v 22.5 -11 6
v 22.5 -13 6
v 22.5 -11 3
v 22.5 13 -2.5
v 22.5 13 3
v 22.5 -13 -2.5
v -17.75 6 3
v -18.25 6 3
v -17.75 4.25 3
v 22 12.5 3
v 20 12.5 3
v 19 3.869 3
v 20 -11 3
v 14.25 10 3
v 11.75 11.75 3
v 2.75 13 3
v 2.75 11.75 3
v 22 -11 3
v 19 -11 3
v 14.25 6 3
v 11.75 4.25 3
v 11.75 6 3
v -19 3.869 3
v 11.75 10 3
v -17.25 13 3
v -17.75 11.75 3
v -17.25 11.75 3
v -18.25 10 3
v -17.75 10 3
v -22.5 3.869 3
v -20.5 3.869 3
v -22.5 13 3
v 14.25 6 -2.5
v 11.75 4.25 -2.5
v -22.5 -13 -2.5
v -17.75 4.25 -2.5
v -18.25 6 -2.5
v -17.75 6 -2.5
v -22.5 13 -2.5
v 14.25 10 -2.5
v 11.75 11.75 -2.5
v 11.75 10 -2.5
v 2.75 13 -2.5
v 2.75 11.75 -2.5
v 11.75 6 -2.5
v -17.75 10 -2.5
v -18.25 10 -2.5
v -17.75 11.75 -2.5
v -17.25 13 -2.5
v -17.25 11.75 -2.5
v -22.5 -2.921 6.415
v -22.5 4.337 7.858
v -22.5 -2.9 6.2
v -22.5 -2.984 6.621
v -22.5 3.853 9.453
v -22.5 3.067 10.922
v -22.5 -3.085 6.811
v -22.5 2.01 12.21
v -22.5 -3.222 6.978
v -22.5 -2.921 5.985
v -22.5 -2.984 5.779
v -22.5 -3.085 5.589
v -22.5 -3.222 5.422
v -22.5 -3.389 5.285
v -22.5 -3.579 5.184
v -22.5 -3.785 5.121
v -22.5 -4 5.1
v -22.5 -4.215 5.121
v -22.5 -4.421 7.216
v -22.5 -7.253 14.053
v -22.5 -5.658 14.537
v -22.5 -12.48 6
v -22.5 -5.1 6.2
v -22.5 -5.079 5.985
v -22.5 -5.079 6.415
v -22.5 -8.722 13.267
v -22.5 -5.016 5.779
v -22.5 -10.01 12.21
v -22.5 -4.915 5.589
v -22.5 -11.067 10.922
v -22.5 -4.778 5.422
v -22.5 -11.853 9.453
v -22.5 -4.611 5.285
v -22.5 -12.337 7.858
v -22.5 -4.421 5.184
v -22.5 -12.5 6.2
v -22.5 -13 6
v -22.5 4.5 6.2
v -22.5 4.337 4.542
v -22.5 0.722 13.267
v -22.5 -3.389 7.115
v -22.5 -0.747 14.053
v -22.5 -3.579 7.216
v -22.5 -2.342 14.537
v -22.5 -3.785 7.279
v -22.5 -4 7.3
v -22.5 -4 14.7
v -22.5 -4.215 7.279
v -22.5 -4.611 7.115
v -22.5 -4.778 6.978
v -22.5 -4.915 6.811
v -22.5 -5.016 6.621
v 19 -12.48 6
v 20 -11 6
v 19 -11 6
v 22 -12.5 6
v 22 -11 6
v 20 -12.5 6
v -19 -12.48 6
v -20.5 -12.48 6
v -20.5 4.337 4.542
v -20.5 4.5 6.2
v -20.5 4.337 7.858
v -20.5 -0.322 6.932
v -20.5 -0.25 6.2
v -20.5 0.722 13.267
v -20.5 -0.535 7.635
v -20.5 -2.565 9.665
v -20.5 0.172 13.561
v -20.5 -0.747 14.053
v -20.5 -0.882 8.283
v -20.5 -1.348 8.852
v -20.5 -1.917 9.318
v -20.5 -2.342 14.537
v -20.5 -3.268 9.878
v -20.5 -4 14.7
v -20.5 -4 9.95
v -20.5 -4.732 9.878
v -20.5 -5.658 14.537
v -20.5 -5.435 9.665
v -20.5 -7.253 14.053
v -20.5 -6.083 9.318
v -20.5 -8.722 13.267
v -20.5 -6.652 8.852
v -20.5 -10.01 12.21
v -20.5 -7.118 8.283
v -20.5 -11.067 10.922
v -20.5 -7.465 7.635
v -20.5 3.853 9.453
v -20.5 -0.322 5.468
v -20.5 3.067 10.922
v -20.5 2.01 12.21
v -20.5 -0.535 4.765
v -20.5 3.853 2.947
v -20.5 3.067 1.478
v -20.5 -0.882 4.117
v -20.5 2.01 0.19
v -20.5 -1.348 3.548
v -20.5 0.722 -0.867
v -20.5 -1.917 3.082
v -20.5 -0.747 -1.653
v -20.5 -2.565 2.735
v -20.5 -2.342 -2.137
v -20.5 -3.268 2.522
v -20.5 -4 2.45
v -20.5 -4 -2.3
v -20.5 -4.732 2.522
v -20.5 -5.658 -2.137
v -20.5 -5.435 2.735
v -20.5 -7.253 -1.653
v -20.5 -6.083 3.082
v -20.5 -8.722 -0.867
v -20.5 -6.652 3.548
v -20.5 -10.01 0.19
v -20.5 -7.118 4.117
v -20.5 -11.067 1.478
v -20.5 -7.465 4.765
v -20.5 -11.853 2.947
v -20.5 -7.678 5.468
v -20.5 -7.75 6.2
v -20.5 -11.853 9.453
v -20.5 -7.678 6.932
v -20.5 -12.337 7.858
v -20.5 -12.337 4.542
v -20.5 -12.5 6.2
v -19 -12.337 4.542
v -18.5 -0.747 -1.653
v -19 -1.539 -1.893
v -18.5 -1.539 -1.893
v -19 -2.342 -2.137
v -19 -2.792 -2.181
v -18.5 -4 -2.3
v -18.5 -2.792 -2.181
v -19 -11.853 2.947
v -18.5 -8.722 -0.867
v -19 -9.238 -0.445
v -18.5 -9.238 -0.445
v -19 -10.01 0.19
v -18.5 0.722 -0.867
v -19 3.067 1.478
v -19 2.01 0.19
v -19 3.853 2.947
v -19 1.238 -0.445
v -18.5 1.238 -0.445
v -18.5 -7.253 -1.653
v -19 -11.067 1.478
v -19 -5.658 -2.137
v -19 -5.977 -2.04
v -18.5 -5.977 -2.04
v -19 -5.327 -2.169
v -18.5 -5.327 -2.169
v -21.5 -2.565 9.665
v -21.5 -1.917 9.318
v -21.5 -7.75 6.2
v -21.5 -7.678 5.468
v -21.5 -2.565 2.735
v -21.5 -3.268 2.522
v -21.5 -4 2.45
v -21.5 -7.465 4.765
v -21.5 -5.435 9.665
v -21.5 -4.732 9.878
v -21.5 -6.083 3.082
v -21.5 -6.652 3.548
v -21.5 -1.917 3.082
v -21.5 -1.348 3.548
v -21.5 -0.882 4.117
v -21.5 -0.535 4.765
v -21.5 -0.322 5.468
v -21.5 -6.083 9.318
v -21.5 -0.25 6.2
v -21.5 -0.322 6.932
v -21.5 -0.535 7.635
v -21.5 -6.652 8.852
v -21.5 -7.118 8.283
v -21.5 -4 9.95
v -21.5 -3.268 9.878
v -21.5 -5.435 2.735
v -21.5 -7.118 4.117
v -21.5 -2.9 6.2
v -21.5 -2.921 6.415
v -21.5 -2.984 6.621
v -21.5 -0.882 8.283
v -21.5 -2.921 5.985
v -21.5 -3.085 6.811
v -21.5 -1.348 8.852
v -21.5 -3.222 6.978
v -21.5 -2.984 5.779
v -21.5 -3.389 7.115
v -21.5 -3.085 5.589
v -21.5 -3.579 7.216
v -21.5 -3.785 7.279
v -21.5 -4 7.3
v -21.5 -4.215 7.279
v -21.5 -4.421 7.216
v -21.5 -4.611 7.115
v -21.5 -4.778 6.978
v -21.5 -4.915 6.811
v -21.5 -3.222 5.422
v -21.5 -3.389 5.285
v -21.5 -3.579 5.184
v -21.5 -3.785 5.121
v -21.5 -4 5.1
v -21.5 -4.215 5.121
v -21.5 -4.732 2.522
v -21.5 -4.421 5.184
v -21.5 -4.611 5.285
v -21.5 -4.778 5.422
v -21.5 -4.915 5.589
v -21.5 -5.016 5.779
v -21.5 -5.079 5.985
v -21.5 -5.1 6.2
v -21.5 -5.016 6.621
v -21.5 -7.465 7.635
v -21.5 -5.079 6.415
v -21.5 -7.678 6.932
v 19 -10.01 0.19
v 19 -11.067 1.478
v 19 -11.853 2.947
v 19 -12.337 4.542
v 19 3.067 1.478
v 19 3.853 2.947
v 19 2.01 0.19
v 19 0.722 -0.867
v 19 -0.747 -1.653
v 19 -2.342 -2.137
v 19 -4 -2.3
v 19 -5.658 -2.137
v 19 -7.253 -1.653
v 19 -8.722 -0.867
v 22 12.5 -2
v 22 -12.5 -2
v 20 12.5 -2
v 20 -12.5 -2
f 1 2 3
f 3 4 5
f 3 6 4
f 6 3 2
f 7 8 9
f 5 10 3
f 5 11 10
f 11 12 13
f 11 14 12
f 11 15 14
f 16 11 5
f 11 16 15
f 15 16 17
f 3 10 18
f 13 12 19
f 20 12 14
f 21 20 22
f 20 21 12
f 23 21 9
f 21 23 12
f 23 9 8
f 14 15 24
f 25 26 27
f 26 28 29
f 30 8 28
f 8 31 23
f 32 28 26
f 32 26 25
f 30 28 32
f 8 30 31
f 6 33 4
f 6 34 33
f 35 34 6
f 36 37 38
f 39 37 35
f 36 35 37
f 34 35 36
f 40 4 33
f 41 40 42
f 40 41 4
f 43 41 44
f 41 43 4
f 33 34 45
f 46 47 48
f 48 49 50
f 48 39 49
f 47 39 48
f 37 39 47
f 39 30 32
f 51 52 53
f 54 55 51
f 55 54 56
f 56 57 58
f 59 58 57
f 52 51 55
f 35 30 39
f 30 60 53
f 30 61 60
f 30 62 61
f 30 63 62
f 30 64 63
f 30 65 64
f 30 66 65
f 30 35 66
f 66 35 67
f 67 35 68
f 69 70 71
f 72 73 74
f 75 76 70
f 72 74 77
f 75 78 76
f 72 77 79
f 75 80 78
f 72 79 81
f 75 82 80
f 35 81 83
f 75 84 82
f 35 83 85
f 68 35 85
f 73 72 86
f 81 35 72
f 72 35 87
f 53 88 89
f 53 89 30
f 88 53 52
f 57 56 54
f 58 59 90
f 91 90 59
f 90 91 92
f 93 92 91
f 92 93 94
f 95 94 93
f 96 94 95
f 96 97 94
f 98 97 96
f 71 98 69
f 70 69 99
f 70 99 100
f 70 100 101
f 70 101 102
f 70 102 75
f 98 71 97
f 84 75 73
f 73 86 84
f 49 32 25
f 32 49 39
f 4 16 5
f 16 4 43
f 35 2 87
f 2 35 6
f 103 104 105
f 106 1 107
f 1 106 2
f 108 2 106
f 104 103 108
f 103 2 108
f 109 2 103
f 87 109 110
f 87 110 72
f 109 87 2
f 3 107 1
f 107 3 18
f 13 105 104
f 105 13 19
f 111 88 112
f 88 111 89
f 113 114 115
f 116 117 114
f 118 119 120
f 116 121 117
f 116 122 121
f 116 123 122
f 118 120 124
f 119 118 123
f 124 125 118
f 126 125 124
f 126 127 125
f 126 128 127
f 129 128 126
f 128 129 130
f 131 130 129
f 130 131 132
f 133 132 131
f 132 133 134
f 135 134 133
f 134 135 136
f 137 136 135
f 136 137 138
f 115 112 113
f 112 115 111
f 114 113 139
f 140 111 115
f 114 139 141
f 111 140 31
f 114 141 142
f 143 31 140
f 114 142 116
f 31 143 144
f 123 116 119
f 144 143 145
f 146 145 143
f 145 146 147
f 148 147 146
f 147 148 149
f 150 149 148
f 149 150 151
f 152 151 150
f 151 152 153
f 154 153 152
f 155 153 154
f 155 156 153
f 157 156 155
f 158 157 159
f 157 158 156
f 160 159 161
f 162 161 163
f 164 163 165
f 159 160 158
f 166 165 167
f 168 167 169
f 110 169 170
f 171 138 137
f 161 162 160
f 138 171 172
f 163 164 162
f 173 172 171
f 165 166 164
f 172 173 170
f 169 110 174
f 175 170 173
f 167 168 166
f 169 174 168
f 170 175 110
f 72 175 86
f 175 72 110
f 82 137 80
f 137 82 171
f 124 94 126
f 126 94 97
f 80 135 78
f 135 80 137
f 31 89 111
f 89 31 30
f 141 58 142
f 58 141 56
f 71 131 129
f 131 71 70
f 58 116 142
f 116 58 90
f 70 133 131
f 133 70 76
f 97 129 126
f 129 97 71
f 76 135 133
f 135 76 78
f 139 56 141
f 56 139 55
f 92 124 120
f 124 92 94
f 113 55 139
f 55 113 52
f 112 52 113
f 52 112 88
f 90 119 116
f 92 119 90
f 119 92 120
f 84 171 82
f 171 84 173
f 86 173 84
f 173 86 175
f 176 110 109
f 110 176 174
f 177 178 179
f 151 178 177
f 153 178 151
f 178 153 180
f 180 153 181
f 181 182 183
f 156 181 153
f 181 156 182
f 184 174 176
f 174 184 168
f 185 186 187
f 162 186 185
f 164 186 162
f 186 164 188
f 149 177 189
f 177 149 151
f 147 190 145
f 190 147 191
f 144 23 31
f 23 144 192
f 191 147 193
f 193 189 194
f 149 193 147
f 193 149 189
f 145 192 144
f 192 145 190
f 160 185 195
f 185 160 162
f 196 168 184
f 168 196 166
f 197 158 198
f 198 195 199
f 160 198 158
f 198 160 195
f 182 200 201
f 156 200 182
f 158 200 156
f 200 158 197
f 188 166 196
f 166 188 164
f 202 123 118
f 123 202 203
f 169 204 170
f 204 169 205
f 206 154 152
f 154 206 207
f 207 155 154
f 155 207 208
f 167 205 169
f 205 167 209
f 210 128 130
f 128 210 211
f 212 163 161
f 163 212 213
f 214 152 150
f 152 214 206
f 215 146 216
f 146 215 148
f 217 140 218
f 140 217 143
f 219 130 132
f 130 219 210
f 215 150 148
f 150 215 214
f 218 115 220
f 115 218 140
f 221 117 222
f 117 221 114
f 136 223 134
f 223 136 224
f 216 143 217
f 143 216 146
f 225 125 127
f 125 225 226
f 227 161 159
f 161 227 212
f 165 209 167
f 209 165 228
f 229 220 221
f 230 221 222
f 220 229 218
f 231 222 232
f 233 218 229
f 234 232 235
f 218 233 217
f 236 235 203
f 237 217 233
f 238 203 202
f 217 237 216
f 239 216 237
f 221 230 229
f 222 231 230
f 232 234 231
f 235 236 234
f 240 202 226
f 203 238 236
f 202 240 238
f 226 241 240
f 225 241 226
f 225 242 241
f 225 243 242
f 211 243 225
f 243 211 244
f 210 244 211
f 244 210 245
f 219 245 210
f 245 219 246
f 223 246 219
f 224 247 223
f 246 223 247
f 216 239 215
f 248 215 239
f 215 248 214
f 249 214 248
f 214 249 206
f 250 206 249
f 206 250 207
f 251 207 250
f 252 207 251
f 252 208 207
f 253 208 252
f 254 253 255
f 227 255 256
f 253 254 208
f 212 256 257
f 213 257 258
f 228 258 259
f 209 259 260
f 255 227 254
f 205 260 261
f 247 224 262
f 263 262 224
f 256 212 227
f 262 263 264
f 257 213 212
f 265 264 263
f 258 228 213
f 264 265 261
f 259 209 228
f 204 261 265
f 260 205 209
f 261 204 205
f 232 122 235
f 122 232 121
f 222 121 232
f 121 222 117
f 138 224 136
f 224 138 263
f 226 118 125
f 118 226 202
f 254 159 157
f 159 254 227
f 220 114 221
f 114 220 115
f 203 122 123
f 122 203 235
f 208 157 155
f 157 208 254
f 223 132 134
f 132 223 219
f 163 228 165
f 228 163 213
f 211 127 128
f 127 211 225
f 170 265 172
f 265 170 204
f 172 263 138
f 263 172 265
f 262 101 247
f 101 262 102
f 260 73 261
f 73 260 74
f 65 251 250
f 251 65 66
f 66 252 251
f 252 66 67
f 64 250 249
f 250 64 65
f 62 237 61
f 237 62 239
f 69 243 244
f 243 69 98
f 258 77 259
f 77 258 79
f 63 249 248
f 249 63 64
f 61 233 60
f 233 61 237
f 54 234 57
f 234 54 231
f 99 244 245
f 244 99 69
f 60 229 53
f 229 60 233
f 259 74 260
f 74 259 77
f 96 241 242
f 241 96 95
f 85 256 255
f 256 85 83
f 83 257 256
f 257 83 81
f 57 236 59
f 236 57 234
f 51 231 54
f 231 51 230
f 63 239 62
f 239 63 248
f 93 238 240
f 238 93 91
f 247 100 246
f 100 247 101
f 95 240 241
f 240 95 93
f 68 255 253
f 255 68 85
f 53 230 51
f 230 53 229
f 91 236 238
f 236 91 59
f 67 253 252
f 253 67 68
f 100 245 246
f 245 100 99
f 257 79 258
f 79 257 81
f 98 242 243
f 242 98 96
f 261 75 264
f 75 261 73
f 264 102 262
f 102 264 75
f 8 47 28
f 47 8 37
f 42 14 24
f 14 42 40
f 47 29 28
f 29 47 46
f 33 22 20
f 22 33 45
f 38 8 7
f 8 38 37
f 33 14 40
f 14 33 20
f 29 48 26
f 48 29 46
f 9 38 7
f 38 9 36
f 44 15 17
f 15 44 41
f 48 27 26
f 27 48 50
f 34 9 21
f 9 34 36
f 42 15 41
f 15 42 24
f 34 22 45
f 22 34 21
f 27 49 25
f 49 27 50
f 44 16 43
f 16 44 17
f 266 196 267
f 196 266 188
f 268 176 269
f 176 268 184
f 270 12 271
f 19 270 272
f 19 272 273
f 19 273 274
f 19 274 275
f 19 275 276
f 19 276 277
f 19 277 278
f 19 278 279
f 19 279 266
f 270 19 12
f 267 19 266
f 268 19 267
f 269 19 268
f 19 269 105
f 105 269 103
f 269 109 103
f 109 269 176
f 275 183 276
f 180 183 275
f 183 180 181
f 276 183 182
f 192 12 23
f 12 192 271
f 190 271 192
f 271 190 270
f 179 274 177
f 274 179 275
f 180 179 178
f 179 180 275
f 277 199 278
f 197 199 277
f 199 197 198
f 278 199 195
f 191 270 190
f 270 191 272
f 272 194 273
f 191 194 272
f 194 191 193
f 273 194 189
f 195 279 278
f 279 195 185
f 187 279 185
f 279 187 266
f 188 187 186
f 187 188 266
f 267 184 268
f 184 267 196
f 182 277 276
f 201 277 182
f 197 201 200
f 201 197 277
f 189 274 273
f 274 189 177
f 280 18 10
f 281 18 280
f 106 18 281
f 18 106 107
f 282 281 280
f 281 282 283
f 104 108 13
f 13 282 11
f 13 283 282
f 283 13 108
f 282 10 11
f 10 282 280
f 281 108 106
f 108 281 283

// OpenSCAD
// file: ../libraries/base_components.scad
BC_OPT_LEGSZ = 5;
BC_OPT_ADDSZ = .5;
BC_OPT_POIDIA = 1.5;

// Battery
module Bat18650Half(center = false){
  if(center == false)
    cylinder(38, d = 17);
  else
    translate([0, 0, -38 / 2])
    cylinder(38, d = 17);  
}

// DIP
module DIP8(legsz = BC_OPT_LEGSZ, addsz = BC_OPT_ADDSZ){
  SX = 9.4 + addsz;
  SY = 6.2 + .8 + addsz;
  SZ = 5;
  
  translate([-SX / 2, -SY / 2, 0])
    cube([SX, SY, SZ]);
  
  for(x = [-1.5, -.5, .5, 1.5])
    for(y = [-1, 1])
    translate([x * 2.54, y * 7.62 / 2, -legsz])
    cylinder(legsz + 5, d = BC_OPT_POIDIA);
}

// POI
module BcPoi(x, y, dia = BC_OPT_POIDIA, legsz = BC_OPT_LEGSZ){
  translate([x, y, -legsz])
    cylinder(legsz, d = dia);
}

// Switch
module BcSwitch7x7(pox_x = 0, pos_y = 0){
  for(x = [-2.54 : 5.08 : 2.54])
    for(y = [-1.9 : 1.9 : 1.9])
      BcPoi(x, y);
}

module BcSwitch7x7Full(add = .2, legsz = 3, up = 0, leg_dia = BC_OPT_POIDIA){
  sz = 7 + add;
  
  translate([-sz / 2, -sz / 2, 0])
  cube([sz, sz, sz + up]);
  
  translate([0, 0, -legsz])
  for(x = [-2.54 : 5.08 : 2.54])
    for(y = [-1.9 : 1.9 : 1.9])
      translate([x, y, 0])
      cylinder(legsz, d = leg_dia);
      //Poi(x, y);
}

module BcLed3mm(legsz = BC_OPT_LEGSZ){
  cylinder(5, d = 3);
  cylinder(1, d = 4.0);
  
  for(x = [-1, 1])
    translate([x * 1.27, 0, -leg_sz])
    cylinder(leg_sz, d = 1);
}

module BcLed5mm(legsz = BC_OPT_LEGSZ){
  cylinder(5, d = 5);
  cylinder(1, d = 6.0);
  
  for(x = [-1, 1])
    translate([x * 1.27, 0, -legsz])
    cylinder(legsz, d = 1);
}
// main file
include <../libraries/base_components.scad>
$fn = 32;

// Version 1.1 (11.12.2023)

// Configure
// 0 - Main Board
// 1 - Logic board
// 2 - Drill board

MODE = 0; // 0, 1, 2.

if(MODE == 0)
  MainBoard();
else if(MODE == 1)
  LogicBoard();
else if(MODE == 2)
  LogicBoard(2);

module MainBoard(){
  SX = 45;
  SY = 26;
  SZ = 3;
  SDZ = 2.5;
  SDZL = SDZ - .2;
  BUT_UP = 1.2;
  
  difference(){
    union(){
      // Board
      translate([-SX / 2, -SY / 2, -SDZ])
        cube([SX, SY, SZ + SDZ]);
      
      // SY wall
      translate([-SX / 2, -SY / 2, 0])
      cube([SX, 2, 6]);
      
      // Battery wall
      translate([-22.5, -4, 5 + BUT_UP])
      rotate([0, 90, 0])
      cylinder(2.0, d = 17);
      
      *translate([+18, 4, 5 + BUT_UP])
      rotate([0, 90, 0])
      cylinder(3.5, d = 17);
    }
    
    // Battery
    translate([0, -4, 5 + BUT_UP])
    rotate([0, 90, 0])
      Bat18650Half(center = true);
    
    // Battery VCC+
          // Battery wall
      translate([-22.5, -4, 5 + BUT_UP])
      rotate([0, 90, 0]){
          translate([0, 0, 2])
          cylinder(2.0, d = 17);

          translate([0, 0, 1])
          #cylinder(1.0, d = 7.5);

          #cylinder(1.0, d = 2.2);
      
      }
    
    // Crona connecter
    translate([20, -25 / 2, -2])
    cube([2, 25, 20]);
    
    // Logic Board
    #translate([-6, 8, 6])
    rotate([90, 0, 180])
    LogicBoard(FILL = 1);    
  }
}

module LogicBoard(FILL = 0){
  SX = 32;
  MX = -4;
  SY = 17;
  SZ = 2;
  SDZ = 2;
  SDZL = SDZ - .2;

  if(FILL == 1){  
    FSX = SX + .5;
    FSY = SY + .5;
    BS = 7 + .5;
    
    // Board
    translate([-FSX / 2 + MX, -FSY / 2, -SDZ])
      cube([FSX, FSY, SZ + SDZ]);  
    
    translate([-14, -5, 0])
    translate([-BS / 2, -3.5, -BS / 2])
    cube([BS + 22, 7, BS]);
    
    translate([-14 + 9, -5, 2])
    translate([-BS / 2, -3.5, -BS / 2])
    cube([BS + 12.5, 7, BS]);
  } else if(FILL == 2){
    FSX = SX;// + .5;
    FSY = SY;// + .5;
    BS = 7;// + .5;
    
    difference(){
      union(){
        // Board
        translate([-FSX / 2 + MX, -FSY / 2, -SDZ])
          cube([FSX, FSY - 5, SZ + SDZ]);
        
        translate([-14, -5, 0])
        translate([-BS / 2, -3.75, -BS / 2])
        cube([BS + 22, 7, BS]);
        
        *translate([-14 + 9, -5, 2])
        translate([-BS / 2, -3.75, -BS / 2])
        cube([BS + 12.5, 7, BS]);
      }
      
      // Drill hole 7x7
      translate([-14, 11.5, 0])
        rotate([90, 0, 0]){
          *#cylinder(20, d = 1.5);
          
          #translate([0, 0, +1.0])
          cylinder(20, d = 4);          
        }
        
      // Drill hole led 3mm
      translate([-8, 11.5, 0])
        rotate([90, 0, 0]){
          *#cylinder(20, d = 1.5);
          
          #translate([0, 0, +1])
          cylinder(20, d = 3);          
        }      
    }
  } else

  difference(){
    union(){
    // Board
    translate([-SX / 2 + MX, -SY / 2, -SDZ])
      cube([SX, SY, SZ + SDZ]);
      
      // Switch case
      translate([-17.5, -5, 0])
      cube([7, 5.5, 3.5]);
    }
   
    // MC34063
    DIP8(legsz = SDZL);
    
    // Holes
    for(x = [-1.5, -.5, .5, 1.5])
    for(y = [-1, 1])
    translate([x * 2.54, y * 6.35, -SDZL])
    cylinder(5 + 5, d = 1.5);
      
     *translate([2.54 * 1.5, -6.35, -SDZL + 1])
      cylinder(10, d = 3);
    
    // Power
    for(y = [1])
    translate([-7, y * 2.54, -SDZL])
      cylinder(10, d = 1.5);
    
    // Result
    for(rc = [[0, -1], [0, 1], [1, -1], [1, 1], [.5, -1.5], [.5, 1.5]])
    //for(x = [0, 1])
    //for(y = [-1, 1])
    translate([7 + rc[0] * 2.54, rc[1] * 2.54, -SDZL])
      cylinder(10, d = 1.5);

    // Switch
    translate([-14, -2, 0])
    rotate([90, 90, 0])
    #BcSwitch7x7Full(legsz = 4);
    
    // + Wire contact
    translate([-14, 3.0, -SDZL])
      cylinder(10, d = 1.5);
    
    // Led
    translate([-7-1, -8, 0])
    rotate([90, 90, 0])
    BcLed3mmMod(legsz = 13);
    
    // Led to Power
    line([-8, -1, SZ - .5], [-12, 3, SZ], .5);
    
    // Led resistor
    *translate([-10, 2.5, -SDZL])
      cylinder(10, d = 1.5);
    // + Body
    translate([-7, 2.5, -SDZL + 1])
      cylinder(10, d = 3);
  }  
}

module BcLed3mmMod(legsz = BC_OPT_LEGSZ){
  cylinder(5, d = 3);
  cylinder(1, d = 4.5);
  
  for(x = [-1, 1]){
    translate([x * 1.27, 0, -legsz - x * 6])
    cylinder(legsz + x * 6, d = 1);
    
    translate([x * 1.27 + x * .5, 0, -legsz -x * 6])
    cylinder(legsz + x * 6, d = 1);  
  }
}

module line(start, end, thickness = 1) {
    hull() {
        translate(start) sphere(thickness);
        translate(end) sphere(thickness);
    }
}
